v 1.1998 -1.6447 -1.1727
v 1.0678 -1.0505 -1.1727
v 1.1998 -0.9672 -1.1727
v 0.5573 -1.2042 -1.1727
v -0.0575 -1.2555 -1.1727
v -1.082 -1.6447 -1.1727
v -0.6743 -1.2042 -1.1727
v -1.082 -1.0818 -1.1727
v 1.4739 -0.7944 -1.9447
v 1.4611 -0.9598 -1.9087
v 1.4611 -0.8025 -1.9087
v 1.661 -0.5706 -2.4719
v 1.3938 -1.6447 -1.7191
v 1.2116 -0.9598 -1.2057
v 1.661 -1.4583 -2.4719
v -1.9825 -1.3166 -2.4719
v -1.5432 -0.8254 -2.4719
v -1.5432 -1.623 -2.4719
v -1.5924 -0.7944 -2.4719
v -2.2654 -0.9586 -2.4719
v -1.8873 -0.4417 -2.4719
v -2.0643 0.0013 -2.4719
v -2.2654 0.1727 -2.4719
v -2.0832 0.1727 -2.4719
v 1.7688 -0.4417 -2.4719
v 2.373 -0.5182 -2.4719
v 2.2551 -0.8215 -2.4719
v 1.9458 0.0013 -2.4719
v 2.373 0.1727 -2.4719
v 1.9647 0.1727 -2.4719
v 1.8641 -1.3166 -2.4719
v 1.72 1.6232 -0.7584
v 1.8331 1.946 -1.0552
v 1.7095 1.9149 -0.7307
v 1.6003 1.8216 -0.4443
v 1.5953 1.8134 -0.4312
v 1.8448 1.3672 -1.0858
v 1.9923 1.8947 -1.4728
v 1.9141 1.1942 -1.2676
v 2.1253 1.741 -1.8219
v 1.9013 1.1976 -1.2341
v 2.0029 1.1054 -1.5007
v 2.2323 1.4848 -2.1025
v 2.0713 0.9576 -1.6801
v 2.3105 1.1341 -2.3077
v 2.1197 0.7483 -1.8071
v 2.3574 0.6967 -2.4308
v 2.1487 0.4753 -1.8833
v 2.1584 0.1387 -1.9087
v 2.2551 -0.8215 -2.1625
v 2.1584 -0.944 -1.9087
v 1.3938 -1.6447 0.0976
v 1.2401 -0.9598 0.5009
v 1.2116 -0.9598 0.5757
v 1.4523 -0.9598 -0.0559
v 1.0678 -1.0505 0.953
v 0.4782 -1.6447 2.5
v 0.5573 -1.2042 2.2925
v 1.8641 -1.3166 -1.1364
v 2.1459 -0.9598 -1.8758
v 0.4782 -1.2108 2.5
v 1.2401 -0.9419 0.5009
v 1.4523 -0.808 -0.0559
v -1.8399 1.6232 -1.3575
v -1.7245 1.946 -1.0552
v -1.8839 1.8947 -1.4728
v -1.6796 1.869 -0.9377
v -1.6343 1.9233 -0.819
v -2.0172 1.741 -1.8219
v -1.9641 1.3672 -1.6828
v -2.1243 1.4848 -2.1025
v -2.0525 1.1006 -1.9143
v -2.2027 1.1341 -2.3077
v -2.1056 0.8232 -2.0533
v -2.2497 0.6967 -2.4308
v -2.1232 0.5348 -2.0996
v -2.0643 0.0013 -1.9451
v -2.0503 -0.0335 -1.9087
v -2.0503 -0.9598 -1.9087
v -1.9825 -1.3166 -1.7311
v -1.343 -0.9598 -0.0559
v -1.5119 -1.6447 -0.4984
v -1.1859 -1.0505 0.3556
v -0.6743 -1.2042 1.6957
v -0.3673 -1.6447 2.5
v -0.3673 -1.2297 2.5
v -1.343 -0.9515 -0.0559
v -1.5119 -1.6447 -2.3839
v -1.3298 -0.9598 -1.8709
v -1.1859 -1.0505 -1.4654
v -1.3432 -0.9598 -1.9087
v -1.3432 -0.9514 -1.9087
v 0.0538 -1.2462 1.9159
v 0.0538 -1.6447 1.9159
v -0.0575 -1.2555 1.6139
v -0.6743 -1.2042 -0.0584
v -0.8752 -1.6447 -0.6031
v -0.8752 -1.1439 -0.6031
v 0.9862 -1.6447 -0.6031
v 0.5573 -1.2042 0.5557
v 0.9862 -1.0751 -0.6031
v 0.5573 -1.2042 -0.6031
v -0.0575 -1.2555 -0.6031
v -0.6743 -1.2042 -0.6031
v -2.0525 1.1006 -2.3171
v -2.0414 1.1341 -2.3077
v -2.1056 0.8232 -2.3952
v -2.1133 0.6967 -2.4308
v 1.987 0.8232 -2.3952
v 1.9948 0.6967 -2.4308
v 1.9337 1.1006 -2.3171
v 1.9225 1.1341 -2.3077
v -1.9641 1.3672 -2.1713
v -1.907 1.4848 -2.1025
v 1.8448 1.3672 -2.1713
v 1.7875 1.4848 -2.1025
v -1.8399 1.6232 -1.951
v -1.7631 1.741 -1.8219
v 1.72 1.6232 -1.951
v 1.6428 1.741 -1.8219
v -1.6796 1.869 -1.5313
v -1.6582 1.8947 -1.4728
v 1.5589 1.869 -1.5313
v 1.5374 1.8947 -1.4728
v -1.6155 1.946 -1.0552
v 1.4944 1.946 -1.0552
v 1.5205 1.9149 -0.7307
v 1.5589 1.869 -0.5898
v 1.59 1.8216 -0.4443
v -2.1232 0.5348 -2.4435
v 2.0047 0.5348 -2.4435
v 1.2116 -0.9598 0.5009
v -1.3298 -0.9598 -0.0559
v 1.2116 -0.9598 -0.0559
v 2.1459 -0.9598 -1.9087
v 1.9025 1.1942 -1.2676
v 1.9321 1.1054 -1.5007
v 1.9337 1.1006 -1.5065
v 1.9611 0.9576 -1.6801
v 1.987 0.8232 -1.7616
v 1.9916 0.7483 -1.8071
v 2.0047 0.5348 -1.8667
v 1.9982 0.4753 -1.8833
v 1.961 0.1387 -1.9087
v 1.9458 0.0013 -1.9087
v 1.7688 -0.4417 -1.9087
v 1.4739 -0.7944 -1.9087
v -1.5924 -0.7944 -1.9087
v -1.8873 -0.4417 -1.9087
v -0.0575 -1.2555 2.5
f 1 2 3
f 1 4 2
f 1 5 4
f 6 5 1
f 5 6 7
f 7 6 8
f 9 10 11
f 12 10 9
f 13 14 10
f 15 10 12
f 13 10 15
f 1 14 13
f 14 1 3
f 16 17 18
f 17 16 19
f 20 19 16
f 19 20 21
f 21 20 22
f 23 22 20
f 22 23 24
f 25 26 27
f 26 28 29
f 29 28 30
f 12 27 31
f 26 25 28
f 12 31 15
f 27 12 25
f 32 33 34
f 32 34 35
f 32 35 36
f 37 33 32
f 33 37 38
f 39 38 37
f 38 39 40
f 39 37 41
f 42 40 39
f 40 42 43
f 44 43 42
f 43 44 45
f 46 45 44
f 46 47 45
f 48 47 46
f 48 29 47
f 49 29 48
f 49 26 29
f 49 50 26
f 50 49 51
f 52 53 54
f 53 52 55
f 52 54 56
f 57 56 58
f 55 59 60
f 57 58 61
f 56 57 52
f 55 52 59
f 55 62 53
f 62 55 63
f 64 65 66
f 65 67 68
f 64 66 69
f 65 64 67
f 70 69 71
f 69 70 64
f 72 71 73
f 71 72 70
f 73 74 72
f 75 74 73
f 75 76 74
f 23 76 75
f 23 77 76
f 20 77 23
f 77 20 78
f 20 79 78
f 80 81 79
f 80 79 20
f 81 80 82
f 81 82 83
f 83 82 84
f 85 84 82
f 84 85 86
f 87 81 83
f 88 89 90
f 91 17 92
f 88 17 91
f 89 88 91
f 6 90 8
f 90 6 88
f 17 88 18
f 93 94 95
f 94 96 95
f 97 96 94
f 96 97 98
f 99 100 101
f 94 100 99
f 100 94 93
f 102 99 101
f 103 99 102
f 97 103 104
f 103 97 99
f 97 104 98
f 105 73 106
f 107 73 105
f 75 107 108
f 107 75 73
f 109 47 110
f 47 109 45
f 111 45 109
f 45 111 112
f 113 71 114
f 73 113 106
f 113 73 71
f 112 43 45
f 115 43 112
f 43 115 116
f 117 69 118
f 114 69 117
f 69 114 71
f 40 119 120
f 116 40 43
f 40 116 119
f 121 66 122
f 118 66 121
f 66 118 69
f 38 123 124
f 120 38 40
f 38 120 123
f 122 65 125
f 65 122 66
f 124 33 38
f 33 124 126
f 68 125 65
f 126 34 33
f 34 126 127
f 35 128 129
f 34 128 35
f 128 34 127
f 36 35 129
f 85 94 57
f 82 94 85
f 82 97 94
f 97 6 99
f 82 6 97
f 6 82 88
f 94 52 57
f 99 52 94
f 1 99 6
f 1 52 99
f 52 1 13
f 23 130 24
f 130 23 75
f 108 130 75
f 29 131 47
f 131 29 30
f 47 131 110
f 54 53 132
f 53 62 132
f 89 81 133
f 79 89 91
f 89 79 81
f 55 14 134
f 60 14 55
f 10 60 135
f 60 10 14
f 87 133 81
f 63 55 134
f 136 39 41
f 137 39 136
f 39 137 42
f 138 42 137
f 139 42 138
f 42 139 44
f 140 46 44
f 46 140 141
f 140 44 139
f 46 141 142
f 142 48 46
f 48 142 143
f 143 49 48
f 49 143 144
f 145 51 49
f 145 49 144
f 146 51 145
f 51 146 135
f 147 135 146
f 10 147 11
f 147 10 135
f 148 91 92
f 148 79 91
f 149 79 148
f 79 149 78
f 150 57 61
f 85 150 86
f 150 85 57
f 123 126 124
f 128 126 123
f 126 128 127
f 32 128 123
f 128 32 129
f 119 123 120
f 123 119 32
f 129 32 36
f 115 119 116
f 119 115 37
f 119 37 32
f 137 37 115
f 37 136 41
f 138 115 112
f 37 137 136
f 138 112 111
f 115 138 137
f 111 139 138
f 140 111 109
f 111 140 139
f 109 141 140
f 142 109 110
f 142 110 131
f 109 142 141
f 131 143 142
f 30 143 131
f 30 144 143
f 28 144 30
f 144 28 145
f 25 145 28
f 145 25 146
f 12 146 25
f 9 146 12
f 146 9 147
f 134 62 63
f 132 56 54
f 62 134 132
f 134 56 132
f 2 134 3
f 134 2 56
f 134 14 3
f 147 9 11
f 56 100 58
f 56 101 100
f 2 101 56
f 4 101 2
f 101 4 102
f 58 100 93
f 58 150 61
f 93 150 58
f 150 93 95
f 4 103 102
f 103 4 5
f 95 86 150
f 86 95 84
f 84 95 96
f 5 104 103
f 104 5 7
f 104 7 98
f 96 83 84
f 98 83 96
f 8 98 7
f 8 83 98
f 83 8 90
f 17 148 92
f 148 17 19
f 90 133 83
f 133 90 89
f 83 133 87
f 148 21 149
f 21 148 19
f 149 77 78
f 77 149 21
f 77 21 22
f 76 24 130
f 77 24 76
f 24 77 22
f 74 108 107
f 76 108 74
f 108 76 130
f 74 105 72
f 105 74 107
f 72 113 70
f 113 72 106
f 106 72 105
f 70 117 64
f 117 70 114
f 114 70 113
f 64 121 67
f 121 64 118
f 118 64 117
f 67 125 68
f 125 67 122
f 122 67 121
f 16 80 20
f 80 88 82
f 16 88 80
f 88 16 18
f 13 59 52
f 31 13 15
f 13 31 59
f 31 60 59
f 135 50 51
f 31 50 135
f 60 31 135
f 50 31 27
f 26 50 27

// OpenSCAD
difint = 2; //  [1: Difference, 2: Intersection]
letter1 = "A";
letter2 = "B";
letter3 = "C";
textFont = "BankGothic Lt BT";
size = 5;

intersectedLetters();

module intersectedLetters()
{
    if(difint == 1)
    {
        difference()
        {
            centerCube(size, size, size);
            if(letter1 != "")
            {
                rotate([90, 0, 0])
                {
                    letter(letter1, size * 2);
                }
            }
            if(letter2 != "")
            {
                rotate([90, 0, 90])
                {
                    letter(letter2, size * 2);
                }
            }
            if(letter3 != "")
            {
                rotate([0, 0, 90])
                {
                    letter(letter3, size * 2);
                }
            }
        }
    }
    else if(difint == 2)
    {
        intersection()
        {
            if(letter1 != "")
            {
                rotate([90, 0, 0])
                {
                    letter(letter1, size);
                }
            }
            if(letter2 != "")
            {
                rotate([90, 0, 90])
                {
                    letter(letter2, size);
                }
            }
            if(letter3 != "")
            {
                rotate([0, 0, 90])
                {
                    letter(letter3, size);
                }
            }
        }
    }
}

module letter(letter, height)
{
    translate([0, 0, -height / 2])
    {
        linear_extrude(height = height)
        {
            text(text = letter, size = size, font = textFont, halign = "center", valign = "center", direction = "ltr", language = "nl", script = "latin");
        }
    }
}

module centerCube(x, y, z)
{
    translate([-x / 2, -y / 2, -z / 2])
    {
        cube([x, y, z]);
    }
}
